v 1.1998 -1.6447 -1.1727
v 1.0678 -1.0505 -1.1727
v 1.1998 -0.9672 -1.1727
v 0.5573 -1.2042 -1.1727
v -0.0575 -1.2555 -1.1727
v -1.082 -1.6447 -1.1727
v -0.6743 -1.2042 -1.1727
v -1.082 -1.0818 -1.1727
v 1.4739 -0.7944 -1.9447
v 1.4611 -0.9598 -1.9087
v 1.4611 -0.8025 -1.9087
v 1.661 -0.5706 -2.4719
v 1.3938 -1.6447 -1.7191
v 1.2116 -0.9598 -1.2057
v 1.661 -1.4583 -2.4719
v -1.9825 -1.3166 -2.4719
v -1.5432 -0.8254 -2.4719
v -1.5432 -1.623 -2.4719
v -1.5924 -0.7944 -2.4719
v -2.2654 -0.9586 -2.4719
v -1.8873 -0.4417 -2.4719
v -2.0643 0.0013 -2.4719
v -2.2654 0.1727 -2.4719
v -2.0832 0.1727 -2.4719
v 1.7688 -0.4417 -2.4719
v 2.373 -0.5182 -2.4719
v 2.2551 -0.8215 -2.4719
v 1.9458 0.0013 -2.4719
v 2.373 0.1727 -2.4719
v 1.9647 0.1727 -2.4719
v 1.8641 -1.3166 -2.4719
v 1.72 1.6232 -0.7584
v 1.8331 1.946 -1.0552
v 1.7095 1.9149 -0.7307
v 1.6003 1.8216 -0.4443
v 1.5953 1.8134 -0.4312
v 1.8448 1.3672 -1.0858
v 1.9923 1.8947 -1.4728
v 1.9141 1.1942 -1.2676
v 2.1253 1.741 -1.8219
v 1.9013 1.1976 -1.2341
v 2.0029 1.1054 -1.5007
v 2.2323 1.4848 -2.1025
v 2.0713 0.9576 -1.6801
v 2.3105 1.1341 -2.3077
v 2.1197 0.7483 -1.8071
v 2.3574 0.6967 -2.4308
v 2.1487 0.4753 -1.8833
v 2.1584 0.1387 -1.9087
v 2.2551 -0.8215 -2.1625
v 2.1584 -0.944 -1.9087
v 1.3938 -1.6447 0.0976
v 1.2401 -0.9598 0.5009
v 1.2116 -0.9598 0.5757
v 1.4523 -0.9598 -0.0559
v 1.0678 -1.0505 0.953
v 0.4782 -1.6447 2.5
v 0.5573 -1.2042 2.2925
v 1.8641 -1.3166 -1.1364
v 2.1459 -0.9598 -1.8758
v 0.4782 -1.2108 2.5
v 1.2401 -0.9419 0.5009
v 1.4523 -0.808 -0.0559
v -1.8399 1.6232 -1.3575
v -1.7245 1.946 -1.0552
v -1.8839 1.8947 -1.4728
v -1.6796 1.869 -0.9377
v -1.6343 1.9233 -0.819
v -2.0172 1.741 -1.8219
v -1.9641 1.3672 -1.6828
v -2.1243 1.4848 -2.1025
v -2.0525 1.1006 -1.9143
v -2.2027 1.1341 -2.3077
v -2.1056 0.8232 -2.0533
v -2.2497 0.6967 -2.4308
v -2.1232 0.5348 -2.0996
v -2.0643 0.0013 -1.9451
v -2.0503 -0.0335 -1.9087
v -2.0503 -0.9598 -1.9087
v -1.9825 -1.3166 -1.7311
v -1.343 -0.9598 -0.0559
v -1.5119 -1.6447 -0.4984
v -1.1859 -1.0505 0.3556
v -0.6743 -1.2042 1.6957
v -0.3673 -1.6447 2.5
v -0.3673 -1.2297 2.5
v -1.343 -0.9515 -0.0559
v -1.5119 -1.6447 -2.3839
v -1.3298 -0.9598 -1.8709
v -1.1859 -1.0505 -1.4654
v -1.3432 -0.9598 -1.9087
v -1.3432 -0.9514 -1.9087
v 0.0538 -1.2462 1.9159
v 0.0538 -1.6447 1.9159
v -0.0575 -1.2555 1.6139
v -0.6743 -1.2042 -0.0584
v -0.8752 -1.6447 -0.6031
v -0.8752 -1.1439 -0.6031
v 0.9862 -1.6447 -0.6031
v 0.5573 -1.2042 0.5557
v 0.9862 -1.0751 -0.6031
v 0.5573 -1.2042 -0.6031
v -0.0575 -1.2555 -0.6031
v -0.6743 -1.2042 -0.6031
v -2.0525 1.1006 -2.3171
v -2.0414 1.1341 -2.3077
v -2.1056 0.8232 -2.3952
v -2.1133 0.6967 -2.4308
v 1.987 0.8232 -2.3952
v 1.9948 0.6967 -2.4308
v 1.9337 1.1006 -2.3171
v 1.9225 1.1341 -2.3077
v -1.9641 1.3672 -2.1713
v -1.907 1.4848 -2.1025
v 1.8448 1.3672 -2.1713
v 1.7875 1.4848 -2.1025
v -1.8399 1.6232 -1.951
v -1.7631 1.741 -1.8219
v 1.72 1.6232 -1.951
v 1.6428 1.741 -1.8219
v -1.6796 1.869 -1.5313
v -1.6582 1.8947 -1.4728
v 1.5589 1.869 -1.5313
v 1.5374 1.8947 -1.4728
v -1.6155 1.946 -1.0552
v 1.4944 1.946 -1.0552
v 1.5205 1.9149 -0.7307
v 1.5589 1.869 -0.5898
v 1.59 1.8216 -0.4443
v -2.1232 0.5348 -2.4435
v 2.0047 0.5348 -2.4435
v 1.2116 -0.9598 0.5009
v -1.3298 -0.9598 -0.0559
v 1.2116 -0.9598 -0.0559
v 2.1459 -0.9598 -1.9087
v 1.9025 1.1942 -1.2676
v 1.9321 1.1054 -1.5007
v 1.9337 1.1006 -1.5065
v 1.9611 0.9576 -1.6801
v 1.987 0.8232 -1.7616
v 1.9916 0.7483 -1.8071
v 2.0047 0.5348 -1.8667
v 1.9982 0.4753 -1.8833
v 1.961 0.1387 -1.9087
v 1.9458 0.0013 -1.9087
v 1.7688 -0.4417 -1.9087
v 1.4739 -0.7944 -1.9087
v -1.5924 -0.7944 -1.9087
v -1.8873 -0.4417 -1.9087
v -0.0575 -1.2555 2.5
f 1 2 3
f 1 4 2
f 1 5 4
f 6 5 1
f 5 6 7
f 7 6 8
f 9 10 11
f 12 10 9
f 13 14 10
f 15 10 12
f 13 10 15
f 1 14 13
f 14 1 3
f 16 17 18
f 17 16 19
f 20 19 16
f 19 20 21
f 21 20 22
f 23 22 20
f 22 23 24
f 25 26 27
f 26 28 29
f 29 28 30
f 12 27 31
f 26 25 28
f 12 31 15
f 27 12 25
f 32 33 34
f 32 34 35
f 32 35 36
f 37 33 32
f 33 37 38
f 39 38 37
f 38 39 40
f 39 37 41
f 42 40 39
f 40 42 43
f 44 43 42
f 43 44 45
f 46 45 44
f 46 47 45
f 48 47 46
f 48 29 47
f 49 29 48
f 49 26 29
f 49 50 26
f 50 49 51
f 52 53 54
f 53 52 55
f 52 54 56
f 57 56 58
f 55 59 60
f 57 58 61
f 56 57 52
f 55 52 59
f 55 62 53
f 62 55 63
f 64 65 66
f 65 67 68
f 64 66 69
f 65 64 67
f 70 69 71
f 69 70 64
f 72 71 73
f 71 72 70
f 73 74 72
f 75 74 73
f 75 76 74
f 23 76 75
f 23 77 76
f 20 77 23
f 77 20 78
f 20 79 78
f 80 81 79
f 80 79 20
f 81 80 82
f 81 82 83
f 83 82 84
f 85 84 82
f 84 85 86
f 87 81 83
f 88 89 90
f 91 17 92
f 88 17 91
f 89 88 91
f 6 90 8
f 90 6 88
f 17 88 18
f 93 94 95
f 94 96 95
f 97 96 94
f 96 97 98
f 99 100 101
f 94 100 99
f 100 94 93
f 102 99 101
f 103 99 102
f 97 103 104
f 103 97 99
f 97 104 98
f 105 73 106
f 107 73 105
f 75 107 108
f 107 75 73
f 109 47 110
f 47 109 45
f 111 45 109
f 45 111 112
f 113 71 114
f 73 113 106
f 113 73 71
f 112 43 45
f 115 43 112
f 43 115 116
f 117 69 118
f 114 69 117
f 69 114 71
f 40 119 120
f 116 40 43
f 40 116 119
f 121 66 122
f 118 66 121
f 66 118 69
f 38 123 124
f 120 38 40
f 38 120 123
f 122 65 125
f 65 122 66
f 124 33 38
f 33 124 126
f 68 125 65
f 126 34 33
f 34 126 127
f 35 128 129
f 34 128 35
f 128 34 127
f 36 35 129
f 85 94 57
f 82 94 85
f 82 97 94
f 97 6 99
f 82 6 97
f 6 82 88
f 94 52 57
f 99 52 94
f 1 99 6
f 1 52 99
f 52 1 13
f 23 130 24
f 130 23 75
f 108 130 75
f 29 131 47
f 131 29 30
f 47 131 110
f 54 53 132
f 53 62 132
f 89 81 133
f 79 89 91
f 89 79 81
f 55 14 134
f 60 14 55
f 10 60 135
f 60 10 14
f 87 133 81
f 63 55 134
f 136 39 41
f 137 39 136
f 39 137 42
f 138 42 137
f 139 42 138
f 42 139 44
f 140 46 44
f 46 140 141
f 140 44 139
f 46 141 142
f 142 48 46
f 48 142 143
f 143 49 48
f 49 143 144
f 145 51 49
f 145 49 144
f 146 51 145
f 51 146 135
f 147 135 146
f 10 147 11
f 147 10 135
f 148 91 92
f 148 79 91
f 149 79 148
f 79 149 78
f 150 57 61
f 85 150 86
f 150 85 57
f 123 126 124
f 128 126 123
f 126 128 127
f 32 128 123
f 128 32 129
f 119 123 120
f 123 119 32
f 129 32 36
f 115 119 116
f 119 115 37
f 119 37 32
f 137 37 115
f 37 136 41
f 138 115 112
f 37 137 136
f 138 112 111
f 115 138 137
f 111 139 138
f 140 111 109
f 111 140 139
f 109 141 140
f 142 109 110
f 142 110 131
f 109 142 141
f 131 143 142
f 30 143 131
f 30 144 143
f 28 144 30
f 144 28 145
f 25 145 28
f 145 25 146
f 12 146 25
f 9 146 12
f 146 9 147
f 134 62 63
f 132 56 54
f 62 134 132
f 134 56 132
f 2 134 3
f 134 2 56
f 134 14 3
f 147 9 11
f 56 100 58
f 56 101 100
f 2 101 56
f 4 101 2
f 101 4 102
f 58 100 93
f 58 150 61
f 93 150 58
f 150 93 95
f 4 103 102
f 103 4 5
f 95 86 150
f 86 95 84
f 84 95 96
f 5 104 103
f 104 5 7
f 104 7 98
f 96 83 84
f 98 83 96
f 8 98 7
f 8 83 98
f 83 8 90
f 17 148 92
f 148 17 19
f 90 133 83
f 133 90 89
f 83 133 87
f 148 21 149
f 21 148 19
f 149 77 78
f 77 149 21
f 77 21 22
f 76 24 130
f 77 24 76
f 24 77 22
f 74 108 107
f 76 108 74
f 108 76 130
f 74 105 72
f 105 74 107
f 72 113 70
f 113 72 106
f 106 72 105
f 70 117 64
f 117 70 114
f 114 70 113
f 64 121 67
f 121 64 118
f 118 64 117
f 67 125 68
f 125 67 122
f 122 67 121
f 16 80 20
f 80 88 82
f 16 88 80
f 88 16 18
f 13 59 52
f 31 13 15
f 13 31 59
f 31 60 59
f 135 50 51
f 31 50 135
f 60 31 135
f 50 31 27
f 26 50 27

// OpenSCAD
difint = 2; //  [1: Difference, 2: Intersection]
letter1 = "A";
letter2 = "B";
letter3 = "C";
textFont = "BankGothic Lt BT";
size = 5;

intersectedLetters();

module intersectedLetters()
{
    if(difint == 1)
    {
        difference()
        {
            centerCube(size, size, size);
            if(letter1 != "")
            {
                rotate([90, 0, 0])
                {
                    letter(letter1, size * 2);
                }
            }
            if(letter2 != "")
            {
                rotate([90, 0, 90])
                {
                    letter(letter2, size * 2);
                }
            }
            if(letter3 != "")
            {
                rotate([0, 0, 90])
                {
                    letter(letter3, size * 2);
                }
            }
        }
    }
    else if(difint == 2)
    {
        intersection()
        {
            if(letter1 != "")
            {
                rotate([90, 0, 0])
                {
                    letter(letter1, size);
                }
            }
            if(letter2 != "")
            {
                rotate([90, 0, 90])
                {
                    letter(letter2, size);
                }
            }
            if(letter3 != "")
            {
                rotate([0, 0, 90])
                {
                    letter(letter3, size);
                }
            }
        }
    }
}

module letter(letter, height)
{
    translate([0, 0, -height / 2])
    {
        linear_extrude(height = height)
        {
            text(text = letter, size = size, font = textFont, halign = "center", valign = "center", direction = "ltr", language = "nl", script = "latin");
        }
    }
}

module centerCube(x, y, z)
{
    translate([-x / 2, -y / 2, -z / 2])
    {
        cube([x, y, z]);
    }
}
